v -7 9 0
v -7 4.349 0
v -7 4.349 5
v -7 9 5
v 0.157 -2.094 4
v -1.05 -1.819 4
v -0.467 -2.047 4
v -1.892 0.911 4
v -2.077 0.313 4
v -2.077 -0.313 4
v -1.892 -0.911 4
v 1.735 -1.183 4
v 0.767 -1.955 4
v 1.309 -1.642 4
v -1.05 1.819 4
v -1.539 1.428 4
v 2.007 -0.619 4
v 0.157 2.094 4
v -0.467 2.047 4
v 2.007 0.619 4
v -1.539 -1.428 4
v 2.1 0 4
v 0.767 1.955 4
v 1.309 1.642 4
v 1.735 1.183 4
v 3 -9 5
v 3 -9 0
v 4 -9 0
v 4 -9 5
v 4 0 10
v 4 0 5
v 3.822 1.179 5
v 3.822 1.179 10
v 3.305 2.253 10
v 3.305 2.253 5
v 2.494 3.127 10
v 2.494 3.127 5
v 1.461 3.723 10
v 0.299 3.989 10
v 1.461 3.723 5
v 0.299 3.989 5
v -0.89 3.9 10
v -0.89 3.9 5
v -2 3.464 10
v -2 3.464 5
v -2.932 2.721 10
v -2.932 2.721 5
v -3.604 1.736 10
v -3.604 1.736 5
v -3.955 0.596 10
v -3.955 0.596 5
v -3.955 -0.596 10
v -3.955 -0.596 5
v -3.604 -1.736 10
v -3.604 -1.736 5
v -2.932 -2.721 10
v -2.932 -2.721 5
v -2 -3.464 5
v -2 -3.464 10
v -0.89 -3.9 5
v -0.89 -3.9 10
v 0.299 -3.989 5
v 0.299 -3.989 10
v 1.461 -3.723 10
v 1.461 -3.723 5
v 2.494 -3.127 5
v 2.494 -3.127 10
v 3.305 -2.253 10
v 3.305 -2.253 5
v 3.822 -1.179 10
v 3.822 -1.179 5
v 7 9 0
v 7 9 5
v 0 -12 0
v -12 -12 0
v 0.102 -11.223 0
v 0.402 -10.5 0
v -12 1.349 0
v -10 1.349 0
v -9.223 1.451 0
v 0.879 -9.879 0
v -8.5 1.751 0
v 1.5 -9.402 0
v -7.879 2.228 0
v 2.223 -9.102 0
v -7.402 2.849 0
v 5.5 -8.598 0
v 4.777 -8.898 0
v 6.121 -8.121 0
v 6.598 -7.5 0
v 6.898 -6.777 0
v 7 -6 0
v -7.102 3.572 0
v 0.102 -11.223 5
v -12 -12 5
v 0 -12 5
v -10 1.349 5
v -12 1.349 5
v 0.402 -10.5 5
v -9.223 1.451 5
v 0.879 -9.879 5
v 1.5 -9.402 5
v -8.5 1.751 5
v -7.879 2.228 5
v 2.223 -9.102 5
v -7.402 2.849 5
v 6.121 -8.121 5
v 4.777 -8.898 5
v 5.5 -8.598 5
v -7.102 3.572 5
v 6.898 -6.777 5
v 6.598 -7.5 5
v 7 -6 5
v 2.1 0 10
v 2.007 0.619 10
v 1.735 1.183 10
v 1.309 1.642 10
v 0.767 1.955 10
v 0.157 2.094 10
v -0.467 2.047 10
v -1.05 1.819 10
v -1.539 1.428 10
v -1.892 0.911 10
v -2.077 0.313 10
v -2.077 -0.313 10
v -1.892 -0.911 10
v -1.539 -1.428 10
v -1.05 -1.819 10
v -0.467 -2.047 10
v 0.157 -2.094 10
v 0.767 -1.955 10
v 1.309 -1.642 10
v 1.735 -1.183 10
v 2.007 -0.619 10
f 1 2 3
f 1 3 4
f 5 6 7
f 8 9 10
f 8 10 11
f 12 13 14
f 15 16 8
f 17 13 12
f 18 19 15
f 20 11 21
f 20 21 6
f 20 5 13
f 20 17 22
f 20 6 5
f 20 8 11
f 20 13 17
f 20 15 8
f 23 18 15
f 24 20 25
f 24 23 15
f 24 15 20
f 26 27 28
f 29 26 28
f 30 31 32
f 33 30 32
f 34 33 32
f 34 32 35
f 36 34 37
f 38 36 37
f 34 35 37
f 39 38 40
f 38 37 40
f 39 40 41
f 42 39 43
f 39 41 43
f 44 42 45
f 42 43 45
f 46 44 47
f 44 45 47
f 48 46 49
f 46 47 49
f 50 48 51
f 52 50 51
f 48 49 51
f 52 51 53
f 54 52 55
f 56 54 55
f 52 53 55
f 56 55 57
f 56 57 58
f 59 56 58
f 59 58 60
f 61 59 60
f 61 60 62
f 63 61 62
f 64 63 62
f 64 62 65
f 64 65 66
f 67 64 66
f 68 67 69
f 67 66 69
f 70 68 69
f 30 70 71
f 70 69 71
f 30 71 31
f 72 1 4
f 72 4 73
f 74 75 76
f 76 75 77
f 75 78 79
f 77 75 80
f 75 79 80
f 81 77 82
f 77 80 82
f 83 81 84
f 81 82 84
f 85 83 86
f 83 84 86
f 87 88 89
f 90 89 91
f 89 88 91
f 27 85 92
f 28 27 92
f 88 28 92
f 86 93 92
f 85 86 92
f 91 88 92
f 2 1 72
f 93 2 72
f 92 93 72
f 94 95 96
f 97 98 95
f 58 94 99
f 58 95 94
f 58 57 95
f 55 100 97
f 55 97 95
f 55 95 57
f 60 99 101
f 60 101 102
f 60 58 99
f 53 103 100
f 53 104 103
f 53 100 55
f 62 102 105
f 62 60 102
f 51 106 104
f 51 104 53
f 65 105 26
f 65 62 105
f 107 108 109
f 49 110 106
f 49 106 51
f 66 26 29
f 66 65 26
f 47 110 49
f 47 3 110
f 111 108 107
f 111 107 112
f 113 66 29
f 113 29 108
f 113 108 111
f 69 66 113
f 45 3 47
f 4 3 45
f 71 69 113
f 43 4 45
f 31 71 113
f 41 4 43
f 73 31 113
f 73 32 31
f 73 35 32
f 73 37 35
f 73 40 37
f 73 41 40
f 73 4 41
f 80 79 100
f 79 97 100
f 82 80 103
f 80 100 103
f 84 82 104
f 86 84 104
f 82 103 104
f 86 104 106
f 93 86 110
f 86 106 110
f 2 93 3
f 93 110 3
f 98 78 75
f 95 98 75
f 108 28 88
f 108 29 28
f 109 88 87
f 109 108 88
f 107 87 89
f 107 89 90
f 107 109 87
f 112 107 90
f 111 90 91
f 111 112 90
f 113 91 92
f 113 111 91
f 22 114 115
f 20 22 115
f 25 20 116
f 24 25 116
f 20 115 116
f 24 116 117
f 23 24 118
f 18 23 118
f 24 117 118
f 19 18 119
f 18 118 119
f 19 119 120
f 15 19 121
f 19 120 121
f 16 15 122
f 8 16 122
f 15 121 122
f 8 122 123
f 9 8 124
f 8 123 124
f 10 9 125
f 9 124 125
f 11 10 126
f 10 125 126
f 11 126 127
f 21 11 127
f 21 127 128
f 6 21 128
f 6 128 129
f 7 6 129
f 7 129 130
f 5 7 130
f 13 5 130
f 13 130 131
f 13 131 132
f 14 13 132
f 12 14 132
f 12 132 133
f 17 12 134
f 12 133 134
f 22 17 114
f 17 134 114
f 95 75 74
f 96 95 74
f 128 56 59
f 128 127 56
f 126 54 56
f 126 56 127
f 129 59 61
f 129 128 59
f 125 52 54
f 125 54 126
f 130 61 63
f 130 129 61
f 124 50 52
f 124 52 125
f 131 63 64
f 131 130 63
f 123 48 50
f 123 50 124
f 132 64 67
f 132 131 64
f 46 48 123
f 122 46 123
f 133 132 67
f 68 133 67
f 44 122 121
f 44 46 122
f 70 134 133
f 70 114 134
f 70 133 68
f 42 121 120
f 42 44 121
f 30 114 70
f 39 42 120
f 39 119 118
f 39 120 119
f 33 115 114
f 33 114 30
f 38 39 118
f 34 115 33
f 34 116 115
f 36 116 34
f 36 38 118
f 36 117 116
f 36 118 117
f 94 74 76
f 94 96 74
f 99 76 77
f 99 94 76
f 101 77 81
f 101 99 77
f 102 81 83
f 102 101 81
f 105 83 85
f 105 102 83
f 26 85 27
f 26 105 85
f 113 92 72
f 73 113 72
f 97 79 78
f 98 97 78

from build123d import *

# Parameters (mm, degrees)
SKETCH1_W      = 14
SKETCH1_H      = 18
EXTRUDE1_DEPTH = 5
SKETCH2_R      = 4
EXTRUDE2_DEPTH = 5
SKETCH3_R      = 2.1
EXTRUDE3_DEPTH = 6
EXTRUDE5_DEPTH = 5
FILLET1_R      = 3


with BuildPart() as part:
    # Sketch1 → Extrude1 (new body)
    with BuildSketch(Plane.XY):
        Rectangle(SKETCH1_W, SKETCH1_H)
    extrude(amount=EXTRUDE1_DEPTH)

    # Sketch2 → Extrude2 (add)
    with BuildSketch(Plane.XY.offset(5)):
        Circle(SKETCH2_R)
    extrude(amount=EXTRUDE2_DEPTH)

    # Sketch3 → Extrude3 (cut)
    with BuildSketch(Plane.XY.offset(10)):
        Circle(SKETCH3_R)
    extrude(amount=-EXTRUDE3_DEPTH, mode=Mode.SUBTRACT)

    # Sketch4 → Extrude5 (add)
    with BuildSketch(Plane.XY):
        Polygon((-7, 1.348977854), (-12, 1.348977854), (-12, -12), (0, -12), (0, -9), (-7, -9), align=None)
    extrude(amount=EXTRUDE5_DEPTH)

    # Fillet1
    fillet1_edges = [part.edges().sort_by_distance(p)[0] for p in [
        (0, -9, 2.5),
        (7, -9, 2.5),
        (-7, 1.348977854, 2.5),
    ]]
    fillet(fillet1_edges, radius=FILLET1_R - 0.0001)  # a hair under: the kernel refuses the full size


solid = part.part
